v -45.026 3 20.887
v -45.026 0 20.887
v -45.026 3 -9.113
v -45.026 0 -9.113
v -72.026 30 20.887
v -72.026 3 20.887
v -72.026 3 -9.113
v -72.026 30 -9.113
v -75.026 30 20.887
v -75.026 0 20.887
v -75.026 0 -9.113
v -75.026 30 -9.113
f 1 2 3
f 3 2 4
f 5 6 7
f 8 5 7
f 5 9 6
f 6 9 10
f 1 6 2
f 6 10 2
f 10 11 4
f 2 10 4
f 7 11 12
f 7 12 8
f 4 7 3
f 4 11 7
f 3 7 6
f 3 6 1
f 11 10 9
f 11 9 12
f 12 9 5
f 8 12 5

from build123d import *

# Parameters (mm, degrees)
SKETCH1_W           = 30
SKETCH1_H           = 30
BOSS_EXTRUDE1_DEPTH = 30
SHELL1_T            = -3


with BuildPart() as part:
    # Sketch1 → Boss-Extrude1 (new body)
    with BuildSketch(Plane(origin=(0, 0, 0), x_dir=(1, 0, 0), z_dir=(0, 1, 0))):
        with Locations((-60.026365989, -5.886774035)):
            Rectangle(SKETCH1_W, SKETCH1_H)
    extrude(amount=BOSS_EXTRUDE1_DEPTH)

    # Shell1
    shell1_openings = [part.faces().sort_by_distance(p)[0] for p in [
        (-60.026365989, 30, 5.886774035),
        (-60.026365989, 15, -9.113225965),
        (-45.026365989, 15, 5.886774035),
        (-60.026365989, 15, 20.886774035),
    ]]
    offset(amount=SHELL1_T, openings=shell1_openings, kind=Kind.INTERSECTION)


solid = part.part
